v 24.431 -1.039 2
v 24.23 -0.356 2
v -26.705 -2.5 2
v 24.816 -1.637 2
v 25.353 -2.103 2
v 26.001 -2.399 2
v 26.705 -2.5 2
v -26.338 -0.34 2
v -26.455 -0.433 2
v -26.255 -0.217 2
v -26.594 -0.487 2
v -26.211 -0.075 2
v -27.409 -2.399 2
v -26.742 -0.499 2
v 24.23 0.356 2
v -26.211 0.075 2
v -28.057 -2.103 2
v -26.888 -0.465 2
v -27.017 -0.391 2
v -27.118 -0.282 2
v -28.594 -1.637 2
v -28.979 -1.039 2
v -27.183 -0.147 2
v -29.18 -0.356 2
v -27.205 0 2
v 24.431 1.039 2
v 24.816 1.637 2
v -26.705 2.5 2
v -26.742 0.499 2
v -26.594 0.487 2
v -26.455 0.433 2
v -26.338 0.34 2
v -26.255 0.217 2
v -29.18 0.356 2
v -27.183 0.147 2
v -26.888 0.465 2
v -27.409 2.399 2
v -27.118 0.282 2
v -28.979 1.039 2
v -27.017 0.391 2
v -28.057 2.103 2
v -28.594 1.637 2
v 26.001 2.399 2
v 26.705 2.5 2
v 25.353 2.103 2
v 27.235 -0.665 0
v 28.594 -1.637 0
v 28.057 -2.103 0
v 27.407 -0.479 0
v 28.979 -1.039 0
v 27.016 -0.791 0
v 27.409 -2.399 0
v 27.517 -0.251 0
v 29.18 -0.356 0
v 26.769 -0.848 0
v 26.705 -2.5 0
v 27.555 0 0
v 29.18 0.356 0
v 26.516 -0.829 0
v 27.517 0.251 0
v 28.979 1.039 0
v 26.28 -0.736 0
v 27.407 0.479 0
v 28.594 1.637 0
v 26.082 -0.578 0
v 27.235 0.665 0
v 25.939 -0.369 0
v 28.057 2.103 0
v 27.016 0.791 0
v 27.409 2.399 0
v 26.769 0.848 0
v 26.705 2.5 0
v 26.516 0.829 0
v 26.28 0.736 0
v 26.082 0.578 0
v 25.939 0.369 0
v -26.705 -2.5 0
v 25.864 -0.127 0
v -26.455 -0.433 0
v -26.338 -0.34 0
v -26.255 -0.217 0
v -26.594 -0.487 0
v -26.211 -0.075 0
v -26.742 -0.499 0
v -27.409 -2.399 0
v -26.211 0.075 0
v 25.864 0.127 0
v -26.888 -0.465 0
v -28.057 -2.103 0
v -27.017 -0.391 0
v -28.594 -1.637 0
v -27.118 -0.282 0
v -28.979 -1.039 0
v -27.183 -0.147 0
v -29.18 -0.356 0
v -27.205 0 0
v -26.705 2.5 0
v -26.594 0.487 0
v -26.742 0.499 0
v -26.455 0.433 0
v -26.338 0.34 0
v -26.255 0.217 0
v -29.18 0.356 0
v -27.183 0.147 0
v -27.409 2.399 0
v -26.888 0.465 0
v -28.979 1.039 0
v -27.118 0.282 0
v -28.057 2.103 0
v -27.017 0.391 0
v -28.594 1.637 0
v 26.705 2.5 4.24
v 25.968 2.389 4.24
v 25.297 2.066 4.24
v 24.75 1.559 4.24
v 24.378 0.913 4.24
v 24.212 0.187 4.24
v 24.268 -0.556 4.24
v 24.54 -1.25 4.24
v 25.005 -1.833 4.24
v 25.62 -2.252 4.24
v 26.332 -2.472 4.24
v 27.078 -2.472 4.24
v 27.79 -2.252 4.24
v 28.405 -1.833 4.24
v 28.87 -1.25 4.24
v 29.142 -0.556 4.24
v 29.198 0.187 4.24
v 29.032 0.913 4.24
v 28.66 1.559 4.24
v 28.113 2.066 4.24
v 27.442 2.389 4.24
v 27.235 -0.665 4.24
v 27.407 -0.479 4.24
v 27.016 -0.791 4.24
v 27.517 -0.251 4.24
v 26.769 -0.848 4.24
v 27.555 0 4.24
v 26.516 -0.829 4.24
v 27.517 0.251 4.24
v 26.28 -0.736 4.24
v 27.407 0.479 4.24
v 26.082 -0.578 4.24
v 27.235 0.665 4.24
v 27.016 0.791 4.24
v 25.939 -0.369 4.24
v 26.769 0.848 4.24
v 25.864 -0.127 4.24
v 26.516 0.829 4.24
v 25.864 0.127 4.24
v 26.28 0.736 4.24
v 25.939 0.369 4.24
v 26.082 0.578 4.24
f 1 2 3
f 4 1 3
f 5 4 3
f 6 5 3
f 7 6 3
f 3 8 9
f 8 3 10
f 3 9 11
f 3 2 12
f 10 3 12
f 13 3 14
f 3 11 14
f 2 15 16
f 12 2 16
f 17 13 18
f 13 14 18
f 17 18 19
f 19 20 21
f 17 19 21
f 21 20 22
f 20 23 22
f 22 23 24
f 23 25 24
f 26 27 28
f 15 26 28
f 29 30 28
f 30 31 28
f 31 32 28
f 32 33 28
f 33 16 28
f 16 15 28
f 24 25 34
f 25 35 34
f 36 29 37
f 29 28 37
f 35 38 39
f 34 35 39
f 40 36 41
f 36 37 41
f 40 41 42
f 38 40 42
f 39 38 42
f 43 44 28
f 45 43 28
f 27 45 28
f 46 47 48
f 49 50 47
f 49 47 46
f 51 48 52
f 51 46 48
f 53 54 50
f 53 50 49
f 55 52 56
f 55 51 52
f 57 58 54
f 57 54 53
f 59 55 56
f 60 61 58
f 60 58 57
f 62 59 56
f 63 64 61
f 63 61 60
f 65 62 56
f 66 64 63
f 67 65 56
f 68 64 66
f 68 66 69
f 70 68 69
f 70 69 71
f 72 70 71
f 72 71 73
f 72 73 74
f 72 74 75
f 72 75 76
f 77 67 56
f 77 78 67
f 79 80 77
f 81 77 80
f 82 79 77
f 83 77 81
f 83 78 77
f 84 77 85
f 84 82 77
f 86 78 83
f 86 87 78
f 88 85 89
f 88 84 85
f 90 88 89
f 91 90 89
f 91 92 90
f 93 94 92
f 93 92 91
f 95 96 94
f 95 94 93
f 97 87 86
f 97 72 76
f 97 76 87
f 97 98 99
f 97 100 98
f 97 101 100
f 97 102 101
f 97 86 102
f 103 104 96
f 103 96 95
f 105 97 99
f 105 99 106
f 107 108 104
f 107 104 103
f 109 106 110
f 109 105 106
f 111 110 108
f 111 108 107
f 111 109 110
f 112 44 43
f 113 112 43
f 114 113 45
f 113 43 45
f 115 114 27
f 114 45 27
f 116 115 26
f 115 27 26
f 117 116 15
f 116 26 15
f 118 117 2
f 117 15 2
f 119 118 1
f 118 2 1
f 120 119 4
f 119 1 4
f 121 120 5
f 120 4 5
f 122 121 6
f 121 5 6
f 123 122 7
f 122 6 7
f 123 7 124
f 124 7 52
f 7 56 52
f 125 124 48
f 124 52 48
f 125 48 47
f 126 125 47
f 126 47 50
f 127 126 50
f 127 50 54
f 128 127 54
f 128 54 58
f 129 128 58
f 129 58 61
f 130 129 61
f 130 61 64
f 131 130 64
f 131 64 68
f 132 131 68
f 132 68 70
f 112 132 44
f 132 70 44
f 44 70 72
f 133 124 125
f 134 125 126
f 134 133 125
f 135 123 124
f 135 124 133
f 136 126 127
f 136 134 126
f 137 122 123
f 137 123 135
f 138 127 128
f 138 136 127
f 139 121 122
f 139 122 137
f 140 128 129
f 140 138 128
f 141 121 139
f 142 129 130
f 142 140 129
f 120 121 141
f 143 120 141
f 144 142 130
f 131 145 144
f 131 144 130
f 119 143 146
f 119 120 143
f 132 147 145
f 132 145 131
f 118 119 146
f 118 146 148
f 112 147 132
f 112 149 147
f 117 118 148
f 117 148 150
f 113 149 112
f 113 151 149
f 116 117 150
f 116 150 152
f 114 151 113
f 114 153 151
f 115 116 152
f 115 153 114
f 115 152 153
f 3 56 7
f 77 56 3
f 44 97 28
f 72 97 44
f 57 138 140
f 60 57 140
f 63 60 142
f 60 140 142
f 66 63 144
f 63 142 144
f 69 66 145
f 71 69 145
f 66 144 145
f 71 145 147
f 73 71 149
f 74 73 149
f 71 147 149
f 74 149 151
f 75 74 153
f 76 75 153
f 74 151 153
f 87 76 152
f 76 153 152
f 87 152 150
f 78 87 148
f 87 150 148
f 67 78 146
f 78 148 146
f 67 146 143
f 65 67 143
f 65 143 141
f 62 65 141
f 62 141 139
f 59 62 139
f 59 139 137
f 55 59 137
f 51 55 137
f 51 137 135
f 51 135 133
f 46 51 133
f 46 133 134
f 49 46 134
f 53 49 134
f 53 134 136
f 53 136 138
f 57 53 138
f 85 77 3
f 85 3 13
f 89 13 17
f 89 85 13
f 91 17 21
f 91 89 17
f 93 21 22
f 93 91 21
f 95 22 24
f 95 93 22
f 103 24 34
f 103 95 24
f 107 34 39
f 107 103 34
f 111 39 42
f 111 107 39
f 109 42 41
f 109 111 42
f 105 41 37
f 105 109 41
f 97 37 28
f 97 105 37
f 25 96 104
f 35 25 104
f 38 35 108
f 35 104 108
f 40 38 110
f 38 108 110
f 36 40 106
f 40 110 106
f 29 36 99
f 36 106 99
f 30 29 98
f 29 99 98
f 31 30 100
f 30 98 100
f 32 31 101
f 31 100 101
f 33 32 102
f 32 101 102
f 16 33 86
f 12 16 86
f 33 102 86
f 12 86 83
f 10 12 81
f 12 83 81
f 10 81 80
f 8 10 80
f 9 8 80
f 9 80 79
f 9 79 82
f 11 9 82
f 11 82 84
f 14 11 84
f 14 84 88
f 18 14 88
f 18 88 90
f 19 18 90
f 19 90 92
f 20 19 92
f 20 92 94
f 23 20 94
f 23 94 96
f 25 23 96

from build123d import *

# Parameters (mm, degrees)
RESSALTO_EXTRUS_O1_DEPTH = 2
ESBO_O3_R                = 2.5
RESSALTO_EXTRUS_O2_DEPTH = 2.24
ESBO_O2_R                = 0.5
CORTE_EXTRUS_O1_DEPTH    = 30.616880744
ESBO_O4_R                = 0.85
CORTE_EXTRUS_O2_DEPTH    = 30.616880744


with BuildPart() as part:
    # Esboço1 → Ressalto-extrusão1 (new body)
    with BuildSketch(Plane.XY):
        with BuildLine():
            Line((-26.705, 2.5), (26.705, 2.5))
            ThreePointArc((26.705, 2.5), (29.205, 0), (26.705, -2.5))
            Line((26.705, -2.5), (-26.705, -2.5))
            ThreePointArc((-26.705, -2.5), (-29.205, 0), (-26.705, 2.5))
        make_face()
    extrude(amount=RESSALTO_EXTRUS_O1_DEPTH)

    # Esboço3 → Ressalto-extrusão2 (add)
    with BuildSketch(Plane.XY.offset(2)):
        with Locations(Location((26.705, 0, 0), (0, 0, 90))):
            Circle(ESBO_O3_R)
    extrude(amount=RESSALTO_EXTRUS_O2_DEPTH)

    # Esboço2 → Corte-extrusão1 (cut, through all)
    with BuildSketch(Plane(origin=(0, 0, 0), x_dir=(-1, 0, 0), z_dir=(0, 0, -1))):
        with Locations((26.705, 0)):
            Circle(ESBO_O2_R)
    extrude(amount=-CORTE_EXTRUS_O1_DEPTH, mode=Mode.SUBTRACT)

    # Esboço4 → Corte-extrusão2 (cut, through all)
    with BuildSketch(Plane.XY.offset(4.24)):
        with Locations((26.705, 0)):
            Circle(ESBO_O4_R)
    extrude(amount=-CORTE_EXTRUS_O2_DEPTH, mode=Mode.SUBTRACT)


solid = part.part
